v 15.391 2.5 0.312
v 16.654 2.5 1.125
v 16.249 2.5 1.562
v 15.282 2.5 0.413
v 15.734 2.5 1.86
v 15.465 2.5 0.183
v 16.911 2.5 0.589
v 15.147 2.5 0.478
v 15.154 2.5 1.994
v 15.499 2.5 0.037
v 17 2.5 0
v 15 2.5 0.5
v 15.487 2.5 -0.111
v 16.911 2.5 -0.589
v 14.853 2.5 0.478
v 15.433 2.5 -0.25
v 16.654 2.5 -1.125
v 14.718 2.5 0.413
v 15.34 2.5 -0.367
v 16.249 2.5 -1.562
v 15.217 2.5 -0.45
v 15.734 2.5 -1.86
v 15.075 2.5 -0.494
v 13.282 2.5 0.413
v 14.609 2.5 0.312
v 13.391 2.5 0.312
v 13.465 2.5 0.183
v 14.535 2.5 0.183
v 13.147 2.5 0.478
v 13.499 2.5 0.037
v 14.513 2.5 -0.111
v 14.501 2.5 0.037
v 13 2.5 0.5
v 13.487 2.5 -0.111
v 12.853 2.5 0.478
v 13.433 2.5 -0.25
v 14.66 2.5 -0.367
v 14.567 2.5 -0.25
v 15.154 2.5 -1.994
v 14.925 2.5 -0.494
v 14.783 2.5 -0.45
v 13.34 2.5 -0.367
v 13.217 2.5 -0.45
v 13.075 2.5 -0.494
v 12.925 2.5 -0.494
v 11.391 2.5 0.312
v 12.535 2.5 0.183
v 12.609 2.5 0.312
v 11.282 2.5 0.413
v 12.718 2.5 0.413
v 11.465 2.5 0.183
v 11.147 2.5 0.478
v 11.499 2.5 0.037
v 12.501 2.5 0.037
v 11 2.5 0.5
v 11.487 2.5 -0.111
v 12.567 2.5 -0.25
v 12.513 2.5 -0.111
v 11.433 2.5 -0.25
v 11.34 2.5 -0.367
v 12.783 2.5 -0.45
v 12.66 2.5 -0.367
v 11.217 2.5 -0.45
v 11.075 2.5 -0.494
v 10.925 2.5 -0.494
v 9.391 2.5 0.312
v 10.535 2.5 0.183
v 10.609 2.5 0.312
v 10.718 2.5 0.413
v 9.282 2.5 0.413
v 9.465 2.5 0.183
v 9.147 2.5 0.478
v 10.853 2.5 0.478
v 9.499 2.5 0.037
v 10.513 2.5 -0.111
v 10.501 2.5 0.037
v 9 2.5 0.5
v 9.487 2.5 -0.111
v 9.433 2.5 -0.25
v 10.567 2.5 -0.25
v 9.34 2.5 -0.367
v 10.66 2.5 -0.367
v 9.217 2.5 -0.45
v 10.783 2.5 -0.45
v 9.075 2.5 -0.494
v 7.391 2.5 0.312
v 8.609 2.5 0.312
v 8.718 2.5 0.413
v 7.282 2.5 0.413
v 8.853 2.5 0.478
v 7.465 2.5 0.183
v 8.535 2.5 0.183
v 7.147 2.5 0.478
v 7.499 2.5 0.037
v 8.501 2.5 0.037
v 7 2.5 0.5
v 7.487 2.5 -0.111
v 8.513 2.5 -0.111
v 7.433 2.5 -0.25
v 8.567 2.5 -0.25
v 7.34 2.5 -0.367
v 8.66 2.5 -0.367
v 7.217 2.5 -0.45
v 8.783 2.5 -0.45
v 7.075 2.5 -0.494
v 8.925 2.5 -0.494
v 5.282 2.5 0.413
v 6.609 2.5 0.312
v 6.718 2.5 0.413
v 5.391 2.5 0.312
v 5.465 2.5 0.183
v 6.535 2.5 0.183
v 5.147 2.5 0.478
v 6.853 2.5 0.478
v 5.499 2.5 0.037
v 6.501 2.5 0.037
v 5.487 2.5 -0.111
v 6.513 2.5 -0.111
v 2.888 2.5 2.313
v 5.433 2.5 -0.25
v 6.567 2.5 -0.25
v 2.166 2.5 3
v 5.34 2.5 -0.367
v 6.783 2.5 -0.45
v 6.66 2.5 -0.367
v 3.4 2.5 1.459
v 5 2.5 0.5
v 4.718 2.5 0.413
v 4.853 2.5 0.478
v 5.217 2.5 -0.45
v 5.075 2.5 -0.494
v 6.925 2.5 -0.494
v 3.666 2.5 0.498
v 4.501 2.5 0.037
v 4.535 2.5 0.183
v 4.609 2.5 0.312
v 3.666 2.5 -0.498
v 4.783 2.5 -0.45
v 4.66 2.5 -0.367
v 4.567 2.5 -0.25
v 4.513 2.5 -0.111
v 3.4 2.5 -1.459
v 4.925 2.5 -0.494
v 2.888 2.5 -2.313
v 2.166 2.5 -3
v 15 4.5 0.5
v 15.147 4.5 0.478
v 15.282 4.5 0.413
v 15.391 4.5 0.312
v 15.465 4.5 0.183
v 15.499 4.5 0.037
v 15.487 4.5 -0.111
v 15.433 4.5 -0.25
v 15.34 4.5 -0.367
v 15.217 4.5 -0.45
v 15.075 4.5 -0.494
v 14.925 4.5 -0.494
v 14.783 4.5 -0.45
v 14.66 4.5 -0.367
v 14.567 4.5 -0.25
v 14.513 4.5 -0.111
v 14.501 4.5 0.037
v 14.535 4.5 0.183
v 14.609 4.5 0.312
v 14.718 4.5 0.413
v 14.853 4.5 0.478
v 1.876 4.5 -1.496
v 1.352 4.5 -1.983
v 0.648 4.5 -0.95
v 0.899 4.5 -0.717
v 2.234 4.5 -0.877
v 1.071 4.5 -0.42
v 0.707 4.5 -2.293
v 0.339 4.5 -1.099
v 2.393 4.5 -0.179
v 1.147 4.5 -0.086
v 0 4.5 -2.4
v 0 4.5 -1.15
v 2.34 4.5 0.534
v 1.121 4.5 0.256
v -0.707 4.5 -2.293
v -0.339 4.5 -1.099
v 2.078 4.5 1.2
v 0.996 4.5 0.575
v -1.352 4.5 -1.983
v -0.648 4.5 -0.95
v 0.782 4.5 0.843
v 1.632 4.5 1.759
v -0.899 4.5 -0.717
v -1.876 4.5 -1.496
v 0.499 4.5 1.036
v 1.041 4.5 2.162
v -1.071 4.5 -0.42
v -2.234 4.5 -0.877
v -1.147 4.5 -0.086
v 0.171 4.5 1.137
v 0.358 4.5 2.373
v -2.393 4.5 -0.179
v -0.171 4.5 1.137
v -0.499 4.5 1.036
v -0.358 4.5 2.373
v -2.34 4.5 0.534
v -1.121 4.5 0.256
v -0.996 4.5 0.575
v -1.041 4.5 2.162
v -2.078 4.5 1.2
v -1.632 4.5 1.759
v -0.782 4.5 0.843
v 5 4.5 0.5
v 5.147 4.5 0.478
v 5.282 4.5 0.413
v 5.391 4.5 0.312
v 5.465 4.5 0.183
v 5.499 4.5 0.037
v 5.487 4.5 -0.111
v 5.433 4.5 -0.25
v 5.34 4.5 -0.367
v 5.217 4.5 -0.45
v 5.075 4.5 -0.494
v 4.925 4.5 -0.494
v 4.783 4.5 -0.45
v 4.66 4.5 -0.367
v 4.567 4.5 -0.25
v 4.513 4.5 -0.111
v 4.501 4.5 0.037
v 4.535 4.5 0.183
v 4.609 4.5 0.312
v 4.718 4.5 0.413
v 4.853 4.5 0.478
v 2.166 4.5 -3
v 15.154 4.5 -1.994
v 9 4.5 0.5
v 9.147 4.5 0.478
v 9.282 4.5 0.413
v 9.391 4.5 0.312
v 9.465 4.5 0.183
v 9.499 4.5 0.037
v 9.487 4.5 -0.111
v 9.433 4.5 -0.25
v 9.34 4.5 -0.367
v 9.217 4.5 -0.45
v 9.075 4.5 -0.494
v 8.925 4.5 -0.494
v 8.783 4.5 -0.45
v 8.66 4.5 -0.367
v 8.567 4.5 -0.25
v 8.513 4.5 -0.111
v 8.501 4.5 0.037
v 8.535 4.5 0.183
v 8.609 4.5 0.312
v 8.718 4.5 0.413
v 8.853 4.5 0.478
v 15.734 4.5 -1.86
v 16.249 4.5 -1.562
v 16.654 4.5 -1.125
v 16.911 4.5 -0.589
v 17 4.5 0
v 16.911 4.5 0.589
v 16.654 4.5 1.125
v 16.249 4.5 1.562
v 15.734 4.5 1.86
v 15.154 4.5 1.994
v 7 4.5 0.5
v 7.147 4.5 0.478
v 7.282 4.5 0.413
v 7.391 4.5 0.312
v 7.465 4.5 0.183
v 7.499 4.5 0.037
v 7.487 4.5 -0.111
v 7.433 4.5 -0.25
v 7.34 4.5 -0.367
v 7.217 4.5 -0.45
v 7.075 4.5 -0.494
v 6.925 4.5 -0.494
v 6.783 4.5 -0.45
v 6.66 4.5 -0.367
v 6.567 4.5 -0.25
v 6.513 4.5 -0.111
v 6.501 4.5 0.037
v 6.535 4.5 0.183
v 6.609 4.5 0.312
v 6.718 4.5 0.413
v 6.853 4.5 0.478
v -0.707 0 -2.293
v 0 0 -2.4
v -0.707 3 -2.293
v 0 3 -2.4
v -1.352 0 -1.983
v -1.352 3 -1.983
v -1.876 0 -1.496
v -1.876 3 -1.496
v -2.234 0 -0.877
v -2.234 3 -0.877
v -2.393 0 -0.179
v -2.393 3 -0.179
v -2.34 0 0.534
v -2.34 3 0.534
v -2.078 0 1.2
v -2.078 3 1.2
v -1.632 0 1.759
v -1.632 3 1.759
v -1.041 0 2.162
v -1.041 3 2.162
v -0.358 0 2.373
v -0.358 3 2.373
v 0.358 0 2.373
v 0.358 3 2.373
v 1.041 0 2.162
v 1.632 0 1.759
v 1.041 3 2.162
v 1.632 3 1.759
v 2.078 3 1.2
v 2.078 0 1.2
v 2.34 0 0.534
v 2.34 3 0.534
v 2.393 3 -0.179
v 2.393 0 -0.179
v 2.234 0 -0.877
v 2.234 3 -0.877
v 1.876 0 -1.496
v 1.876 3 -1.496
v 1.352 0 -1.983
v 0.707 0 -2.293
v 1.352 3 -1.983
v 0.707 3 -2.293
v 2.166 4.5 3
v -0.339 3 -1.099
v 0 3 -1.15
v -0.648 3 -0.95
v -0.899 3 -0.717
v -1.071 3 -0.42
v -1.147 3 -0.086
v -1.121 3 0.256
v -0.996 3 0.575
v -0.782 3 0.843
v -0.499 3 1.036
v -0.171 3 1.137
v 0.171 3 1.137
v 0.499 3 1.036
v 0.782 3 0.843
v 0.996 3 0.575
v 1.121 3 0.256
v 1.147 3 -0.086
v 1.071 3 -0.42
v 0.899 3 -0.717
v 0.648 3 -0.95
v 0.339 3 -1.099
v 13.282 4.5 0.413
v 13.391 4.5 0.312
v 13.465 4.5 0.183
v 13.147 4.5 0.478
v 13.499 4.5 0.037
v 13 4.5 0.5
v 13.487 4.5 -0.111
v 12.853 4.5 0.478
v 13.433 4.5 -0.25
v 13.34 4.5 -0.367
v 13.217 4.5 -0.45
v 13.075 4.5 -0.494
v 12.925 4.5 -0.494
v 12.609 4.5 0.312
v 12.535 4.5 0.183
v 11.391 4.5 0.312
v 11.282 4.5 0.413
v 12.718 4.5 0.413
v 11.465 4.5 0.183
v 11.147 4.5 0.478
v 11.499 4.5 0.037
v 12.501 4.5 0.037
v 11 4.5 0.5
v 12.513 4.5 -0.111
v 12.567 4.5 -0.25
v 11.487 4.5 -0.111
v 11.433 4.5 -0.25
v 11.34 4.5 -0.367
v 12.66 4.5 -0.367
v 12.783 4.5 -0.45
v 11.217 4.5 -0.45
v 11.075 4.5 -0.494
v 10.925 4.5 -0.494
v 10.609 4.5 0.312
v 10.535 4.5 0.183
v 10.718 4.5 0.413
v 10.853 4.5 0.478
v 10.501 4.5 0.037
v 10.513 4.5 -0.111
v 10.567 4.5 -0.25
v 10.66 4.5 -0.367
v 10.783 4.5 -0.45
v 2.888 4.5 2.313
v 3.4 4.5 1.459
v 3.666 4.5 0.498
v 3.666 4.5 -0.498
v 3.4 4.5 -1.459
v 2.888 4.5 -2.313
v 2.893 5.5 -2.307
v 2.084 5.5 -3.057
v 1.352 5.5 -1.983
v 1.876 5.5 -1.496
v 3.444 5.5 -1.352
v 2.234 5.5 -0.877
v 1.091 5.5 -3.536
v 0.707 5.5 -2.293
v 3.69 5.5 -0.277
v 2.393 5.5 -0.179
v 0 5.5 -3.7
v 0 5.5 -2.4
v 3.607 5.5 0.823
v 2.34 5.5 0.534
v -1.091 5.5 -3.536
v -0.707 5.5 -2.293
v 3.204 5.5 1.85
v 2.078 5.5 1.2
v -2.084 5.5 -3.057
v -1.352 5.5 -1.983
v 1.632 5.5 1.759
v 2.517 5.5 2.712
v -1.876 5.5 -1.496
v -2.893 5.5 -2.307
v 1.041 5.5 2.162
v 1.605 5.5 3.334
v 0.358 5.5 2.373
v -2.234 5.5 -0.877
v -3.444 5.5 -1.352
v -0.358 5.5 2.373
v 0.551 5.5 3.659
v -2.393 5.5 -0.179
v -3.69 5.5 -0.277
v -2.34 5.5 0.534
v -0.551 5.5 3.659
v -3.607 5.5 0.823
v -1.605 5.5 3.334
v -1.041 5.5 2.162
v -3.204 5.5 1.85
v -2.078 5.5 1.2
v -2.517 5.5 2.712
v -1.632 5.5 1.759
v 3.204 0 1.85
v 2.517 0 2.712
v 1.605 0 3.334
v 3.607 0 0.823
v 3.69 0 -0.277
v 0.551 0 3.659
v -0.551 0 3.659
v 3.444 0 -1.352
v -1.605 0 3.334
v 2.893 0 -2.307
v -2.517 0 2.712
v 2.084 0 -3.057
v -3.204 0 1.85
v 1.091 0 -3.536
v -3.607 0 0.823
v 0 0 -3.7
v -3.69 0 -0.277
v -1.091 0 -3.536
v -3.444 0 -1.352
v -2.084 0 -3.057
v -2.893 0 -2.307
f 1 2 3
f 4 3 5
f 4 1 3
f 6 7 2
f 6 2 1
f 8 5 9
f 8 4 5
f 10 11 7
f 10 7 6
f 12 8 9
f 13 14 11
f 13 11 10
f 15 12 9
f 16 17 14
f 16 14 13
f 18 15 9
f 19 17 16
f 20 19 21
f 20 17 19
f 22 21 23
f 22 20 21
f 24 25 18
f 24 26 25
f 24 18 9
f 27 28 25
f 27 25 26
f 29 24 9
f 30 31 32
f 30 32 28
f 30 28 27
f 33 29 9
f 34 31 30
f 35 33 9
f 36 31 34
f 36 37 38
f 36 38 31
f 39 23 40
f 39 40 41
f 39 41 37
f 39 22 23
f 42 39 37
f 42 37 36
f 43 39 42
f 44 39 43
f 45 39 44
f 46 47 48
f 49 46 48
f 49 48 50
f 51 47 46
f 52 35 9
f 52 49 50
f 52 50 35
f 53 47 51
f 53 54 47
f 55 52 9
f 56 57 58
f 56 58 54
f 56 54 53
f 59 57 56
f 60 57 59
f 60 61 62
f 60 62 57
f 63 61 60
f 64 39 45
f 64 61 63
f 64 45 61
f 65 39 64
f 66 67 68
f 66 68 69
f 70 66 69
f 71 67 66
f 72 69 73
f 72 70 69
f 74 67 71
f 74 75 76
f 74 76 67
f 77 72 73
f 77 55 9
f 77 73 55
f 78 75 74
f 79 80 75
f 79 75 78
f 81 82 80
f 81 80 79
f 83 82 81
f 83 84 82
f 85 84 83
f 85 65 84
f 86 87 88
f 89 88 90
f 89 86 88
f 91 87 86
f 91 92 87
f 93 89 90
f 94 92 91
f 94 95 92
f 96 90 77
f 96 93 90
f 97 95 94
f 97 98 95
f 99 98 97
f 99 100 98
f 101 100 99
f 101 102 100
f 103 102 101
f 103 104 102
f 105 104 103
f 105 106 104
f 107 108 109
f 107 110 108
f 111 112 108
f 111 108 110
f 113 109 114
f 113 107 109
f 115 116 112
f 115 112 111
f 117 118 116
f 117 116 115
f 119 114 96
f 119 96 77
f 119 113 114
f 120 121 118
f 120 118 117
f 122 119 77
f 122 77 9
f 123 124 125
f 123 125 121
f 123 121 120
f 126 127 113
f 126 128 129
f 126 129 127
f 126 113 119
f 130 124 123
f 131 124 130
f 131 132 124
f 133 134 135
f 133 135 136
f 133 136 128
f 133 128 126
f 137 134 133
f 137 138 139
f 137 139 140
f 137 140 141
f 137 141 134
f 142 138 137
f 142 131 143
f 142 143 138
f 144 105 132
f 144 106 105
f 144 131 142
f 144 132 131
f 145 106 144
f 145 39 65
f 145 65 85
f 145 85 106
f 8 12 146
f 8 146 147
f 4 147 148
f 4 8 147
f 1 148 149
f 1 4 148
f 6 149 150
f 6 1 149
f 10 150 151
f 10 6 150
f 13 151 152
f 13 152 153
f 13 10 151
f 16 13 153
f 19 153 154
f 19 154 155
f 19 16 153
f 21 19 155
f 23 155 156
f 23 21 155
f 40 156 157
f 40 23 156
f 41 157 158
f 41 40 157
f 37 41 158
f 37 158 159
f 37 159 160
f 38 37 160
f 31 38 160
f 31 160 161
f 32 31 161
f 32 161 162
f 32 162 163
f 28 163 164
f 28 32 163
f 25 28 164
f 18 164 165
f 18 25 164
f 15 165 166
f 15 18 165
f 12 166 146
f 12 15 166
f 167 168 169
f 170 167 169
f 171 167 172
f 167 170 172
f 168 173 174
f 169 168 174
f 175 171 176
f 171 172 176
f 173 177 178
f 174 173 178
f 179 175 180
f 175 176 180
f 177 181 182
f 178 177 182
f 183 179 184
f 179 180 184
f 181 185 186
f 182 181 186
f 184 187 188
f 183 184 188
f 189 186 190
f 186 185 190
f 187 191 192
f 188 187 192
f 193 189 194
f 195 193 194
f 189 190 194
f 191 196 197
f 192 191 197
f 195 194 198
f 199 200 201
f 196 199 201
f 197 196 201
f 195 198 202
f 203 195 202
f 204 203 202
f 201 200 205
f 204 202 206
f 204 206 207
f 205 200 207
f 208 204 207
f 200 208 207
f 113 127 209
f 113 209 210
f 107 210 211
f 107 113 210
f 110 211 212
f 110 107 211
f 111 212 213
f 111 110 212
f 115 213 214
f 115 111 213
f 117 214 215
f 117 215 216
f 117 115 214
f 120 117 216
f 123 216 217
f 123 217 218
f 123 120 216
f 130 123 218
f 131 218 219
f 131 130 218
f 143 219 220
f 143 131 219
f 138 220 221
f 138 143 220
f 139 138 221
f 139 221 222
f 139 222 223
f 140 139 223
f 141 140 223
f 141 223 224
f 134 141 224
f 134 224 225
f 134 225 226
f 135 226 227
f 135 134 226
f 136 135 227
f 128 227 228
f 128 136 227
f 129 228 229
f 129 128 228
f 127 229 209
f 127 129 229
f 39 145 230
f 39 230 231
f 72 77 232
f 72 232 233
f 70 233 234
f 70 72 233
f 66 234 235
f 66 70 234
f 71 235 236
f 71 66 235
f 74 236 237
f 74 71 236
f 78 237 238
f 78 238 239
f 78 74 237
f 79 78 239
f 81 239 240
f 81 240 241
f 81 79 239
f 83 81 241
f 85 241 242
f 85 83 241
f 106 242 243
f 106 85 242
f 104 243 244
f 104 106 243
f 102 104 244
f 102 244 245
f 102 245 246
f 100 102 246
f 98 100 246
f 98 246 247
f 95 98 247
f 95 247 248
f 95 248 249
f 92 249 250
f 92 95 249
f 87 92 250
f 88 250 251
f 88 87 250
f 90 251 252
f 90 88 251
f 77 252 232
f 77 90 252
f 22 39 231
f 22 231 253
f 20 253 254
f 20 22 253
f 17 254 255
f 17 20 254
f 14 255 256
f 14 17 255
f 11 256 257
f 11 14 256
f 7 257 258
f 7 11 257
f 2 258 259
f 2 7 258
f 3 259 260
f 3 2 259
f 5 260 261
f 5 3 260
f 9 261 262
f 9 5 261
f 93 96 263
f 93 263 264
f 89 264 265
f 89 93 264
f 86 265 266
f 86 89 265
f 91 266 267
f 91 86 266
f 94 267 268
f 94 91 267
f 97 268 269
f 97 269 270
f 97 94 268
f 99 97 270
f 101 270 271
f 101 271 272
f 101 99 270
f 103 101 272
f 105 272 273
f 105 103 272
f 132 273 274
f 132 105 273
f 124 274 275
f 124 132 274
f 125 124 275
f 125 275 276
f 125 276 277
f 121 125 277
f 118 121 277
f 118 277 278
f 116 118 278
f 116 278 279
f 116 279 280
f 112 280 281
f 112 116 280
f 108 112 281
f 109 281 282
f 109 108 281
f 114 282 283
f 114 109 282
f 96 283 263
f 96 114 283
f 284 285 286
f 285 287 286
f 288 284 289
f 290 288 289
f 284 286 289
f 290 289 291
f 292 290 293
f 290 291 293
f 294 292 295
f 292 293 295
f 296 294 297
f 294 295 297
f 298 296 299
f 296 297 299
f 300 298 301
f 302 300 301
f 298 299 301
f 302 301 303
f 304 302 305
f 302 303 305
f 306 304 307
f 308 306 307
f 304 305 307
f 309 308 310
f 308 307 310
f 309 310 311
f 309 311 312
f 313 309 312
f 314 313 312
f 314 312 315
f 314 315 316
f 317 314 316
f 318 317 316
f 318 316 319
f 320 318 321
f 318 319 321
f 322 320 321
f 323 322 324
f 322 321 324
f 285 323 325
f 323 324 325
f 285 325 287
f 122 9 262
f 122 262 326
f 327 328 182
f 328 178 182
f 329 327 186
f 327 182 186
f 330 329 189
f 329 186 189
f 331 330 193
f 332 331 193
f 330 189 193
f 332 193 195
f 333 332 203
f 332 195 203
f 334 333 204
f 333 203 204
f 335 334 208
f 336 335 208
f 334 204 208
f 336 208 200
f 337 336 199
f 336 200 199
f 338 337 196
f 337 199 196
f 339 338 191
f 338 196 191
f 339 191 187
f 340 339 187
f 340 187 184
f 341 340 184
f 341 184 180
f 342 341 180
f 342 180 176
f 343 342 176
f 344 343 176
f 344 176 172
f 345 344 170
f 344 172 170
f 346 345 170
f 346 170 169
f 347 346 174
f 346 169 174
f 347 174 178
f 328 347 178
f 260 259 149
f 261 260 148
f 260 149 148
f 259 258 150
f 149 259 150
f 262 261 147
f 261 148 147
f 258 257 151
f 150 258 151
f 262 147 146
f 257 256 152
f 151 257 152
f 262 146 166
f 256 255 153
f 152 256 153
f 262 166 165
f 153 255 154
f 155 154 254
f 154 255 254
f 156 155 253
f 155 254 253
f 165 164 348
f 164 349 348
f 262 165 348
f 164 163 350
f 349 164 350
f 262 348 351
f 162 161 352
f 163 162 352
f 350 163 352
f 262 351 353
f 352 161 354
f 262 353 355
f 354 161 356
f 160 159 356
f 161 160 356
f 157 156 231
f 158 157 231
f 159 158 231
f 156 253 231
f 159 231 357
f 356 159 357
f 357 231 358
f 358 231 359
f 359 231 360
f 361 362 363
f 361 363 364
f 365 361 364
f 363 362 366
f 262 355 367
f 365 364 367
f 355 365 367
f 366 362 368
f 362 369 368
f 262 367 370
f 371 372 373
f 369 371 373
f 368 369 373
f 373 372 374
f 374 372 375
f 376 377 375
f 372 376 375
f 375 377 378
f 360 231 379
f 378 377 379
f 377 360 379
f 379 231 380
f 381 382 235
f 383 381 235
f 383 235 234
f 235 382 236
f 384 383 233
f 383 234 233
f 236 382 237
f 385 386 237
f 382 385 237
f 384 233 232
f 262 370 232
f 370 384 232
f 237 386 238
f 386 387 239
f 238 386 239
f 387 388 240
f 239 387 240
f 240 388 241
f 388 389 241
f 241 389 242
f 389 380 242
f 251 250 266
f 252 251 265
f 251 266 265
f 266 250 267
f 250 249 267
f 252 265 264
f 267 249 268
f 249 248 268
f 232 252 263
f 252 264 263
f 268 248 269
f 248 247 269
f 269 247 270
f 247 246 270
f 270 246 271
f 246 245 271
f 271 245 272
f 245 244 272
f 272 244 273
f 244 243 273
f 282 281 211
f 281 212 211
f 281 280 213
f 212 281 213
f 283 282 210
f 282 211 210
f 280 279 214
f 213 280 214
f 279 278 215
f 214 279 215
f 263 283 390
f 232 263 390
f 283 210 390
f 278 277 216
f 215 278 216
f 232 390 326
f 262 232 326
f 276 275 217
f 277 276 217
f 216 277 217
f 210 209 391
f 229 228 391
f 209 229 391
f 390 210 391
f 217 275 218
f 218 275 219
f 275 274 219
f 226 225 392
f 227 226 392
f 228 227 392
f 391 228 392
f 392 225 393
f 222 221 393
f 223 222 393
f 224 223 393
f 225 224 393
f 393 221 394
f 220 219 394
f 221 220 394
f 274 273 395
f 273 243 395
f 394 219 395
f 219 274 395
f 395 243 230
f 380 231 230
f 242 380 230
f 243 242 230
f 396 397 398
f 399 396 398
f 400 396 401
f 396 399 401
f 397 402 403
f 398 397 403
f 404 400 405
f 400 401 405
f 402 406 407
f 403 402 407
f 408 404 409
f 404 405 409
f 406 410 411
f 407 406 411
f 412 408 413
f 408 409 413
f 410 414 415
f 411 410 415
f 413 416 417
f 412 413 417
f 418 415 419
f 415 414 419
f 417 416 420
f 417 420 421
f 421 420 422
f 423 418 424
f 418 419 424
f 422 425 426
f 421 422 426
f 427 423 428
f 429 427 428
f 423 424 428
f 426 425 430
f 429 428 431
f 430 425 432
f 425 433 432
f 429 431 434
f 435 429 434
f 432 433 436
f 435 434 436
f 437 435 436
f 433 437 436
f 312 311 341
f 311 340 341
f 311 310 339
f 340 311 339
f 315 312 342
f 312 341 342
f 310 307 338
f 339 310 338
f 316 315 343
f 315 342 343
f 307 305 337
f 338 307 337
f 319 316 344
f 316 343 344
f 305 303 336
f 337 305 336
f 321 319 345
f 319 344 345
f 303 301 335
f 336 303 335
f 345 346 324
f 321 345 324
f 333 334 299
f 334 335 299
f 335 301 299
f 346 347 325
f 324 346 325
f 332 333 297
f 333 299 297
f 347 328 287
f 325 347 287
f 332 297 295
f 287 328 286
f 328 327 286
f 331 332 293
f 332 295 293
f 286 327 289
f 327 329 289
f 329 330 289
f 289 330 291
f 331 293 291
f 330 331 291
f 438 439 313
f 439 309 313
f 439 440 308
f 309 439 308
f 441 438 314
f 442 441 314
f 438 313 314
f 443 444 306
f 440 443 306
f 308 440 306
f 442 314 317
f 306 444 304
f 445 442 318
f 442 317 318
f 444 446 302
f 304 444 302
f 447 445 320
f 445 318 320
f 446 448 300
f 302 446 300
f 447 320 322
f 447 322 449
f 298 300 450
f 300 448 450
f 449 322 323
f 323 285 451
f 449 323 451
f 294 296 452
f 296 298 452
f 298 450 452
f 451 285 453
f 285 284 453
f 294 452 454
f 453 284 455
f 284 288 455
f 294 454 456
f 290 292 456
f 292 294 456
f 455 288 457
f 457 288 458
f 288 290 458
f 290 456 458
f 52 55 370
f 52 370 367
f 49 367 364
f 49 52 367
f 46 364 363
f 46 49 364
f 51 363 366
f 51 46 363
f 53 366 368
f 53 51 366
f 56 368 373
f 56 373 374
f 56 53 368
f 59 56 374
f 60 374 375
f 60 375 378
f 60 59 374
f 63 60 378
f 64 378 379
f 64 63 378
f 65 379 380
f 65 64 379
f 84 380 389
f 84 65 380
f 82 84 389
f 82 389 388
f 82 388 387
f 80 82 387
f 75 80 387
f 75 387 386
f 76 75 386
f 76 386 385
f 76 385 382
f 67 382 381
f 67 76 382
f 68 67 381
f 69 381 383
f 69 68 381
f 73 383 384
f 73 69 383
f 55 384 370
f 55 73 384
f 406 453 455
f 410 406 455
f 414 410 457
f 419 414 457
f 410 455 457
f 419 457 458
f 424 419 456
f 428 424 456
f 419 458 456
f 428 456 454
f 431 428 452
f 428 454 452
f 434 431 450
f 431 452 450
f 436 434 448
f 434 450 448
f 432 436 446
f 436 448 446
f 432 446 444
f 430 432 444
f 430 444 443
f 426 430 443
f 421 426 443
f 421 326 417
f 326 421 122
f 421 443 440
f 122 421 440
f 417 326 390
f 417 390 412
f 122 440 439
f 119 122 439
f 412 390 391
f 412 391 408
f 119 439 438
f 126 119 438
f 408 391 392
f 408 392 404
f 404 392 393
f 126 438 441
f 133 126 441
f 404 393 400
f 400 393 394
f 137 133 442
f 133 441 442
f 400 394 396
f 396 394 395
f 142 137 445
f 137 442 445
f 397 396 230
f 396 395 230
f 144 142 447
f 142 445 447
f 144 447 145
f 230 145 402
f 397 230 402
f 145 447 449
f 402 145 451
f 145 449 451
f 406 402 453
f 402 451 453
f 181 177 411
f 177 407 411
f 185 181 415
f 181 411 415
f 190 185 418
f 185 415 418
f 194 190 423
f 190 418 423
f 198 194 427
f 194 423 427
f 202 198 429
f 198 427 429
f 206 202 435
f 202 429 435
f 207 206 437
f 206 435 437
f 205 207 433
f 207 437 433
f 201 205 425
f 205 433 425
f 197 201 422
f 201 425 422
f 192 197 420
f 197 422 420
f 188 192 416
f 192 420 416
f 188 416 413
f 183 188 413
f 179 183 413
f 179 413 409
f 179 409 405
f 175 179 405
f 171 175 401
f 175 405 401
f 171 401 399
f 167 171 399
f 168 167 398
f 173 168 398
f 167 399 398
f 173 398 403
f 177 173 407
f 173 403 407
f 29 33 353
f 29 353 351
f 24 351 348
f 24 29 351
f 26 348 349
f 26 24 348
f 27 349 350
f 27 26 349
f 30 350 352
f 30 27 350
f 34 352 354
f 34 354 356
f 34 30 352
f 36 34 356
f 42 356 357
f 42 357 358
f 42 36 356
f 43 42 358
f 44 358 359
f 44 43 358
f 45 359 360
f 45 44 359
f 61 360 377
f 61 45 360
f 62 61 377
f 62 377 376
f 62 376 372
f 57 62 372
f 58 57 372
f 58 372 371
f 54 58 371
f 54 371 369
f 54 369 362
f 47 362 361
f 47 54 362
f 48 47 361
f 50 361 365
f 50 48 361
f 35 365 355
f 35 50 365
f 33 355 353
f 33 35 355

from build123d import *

# Parameters (mm, degrees)
BOSS_EXTRU_1_START = -3
ESQUISSE2_R        = 0.5
BOSS_EXTRU_1_DEPTH = 2


with BuildPart() as part:
    # Esquisse1 → Révolution1 (revolve)
    with BuildSketch(Plane.XY, mode=Mode.PRIVATE) as r_volution1_sk:
        Polygon((-2.4, 0), (-2.4, 3), (-1.15, 3), (-1.15, 4.5), (-2.4, 4.5), (-2.4, 5.5), (-3.7, 5.5), (-3.7, 0), align=None)
    revolve(r_volution1_sk.sketch.rotate(Axis((0, 0, 0), (0, 1, 0)), 270), axis=Axis((0, 0, 0), (0, 1, 0)))

    # Esquisse2 → Boss.-Extru.1 (add)
    with BuildSketch(Plane(origin=(0, 5.5, 0), x_dir=(1, 0, 0), z_dir=(0, 1, 0)).offset(BOSS_EXTRU_1_START)):
        with BuildLine():
            Line((2.165640783, 3), (15.15443587, 1.994028476))
            ThreePointArc((15.15443587, 1.994028476), (17, 0), (15.15443587, -1.994028476))
            Line((15.15443587, -1.994028476), (2.165640783, -3))
            ThreePointArc((2.165640783, -3), (3.7, 0), (2.165640783, 3))
        make_face()
        with Locations(Location((15, 0, 0), (0, 0, 270))):
            Circle(ESQUISSE2_R, mode=Mode.SUBTRACT)
        with Locations(Location((13, 0, 0), (0, 0, 270))):
            Circle(ESQUISSE2_R, mode=Mode.SUBTRACT)
        with Locations(Location((11, 0, 0), (0, 0, 270))):
            Circle(ESQUISSE2_R, mode=Mode.SUBTRACT)
        with Locations(Location((9, 0, 0), (0, 0, 270))):
            Circle(ESQUISSE2_R, mode=Mode.SUBTRACT)
        with Locations(Location((7, 0, 0), (0, 0, 270))):
            Circle(ESQUISSE2_R, mode=Mode.SUBTRACT)
        with Locations(Location((5, 0, 0), (0, 0, 270))):
            Circle(ESQUISSE2_R, mode=Mode.SUBTRACT)
    extrude(amount=BOSS_EXTRU_1_DEPTH)


solid = part.part
